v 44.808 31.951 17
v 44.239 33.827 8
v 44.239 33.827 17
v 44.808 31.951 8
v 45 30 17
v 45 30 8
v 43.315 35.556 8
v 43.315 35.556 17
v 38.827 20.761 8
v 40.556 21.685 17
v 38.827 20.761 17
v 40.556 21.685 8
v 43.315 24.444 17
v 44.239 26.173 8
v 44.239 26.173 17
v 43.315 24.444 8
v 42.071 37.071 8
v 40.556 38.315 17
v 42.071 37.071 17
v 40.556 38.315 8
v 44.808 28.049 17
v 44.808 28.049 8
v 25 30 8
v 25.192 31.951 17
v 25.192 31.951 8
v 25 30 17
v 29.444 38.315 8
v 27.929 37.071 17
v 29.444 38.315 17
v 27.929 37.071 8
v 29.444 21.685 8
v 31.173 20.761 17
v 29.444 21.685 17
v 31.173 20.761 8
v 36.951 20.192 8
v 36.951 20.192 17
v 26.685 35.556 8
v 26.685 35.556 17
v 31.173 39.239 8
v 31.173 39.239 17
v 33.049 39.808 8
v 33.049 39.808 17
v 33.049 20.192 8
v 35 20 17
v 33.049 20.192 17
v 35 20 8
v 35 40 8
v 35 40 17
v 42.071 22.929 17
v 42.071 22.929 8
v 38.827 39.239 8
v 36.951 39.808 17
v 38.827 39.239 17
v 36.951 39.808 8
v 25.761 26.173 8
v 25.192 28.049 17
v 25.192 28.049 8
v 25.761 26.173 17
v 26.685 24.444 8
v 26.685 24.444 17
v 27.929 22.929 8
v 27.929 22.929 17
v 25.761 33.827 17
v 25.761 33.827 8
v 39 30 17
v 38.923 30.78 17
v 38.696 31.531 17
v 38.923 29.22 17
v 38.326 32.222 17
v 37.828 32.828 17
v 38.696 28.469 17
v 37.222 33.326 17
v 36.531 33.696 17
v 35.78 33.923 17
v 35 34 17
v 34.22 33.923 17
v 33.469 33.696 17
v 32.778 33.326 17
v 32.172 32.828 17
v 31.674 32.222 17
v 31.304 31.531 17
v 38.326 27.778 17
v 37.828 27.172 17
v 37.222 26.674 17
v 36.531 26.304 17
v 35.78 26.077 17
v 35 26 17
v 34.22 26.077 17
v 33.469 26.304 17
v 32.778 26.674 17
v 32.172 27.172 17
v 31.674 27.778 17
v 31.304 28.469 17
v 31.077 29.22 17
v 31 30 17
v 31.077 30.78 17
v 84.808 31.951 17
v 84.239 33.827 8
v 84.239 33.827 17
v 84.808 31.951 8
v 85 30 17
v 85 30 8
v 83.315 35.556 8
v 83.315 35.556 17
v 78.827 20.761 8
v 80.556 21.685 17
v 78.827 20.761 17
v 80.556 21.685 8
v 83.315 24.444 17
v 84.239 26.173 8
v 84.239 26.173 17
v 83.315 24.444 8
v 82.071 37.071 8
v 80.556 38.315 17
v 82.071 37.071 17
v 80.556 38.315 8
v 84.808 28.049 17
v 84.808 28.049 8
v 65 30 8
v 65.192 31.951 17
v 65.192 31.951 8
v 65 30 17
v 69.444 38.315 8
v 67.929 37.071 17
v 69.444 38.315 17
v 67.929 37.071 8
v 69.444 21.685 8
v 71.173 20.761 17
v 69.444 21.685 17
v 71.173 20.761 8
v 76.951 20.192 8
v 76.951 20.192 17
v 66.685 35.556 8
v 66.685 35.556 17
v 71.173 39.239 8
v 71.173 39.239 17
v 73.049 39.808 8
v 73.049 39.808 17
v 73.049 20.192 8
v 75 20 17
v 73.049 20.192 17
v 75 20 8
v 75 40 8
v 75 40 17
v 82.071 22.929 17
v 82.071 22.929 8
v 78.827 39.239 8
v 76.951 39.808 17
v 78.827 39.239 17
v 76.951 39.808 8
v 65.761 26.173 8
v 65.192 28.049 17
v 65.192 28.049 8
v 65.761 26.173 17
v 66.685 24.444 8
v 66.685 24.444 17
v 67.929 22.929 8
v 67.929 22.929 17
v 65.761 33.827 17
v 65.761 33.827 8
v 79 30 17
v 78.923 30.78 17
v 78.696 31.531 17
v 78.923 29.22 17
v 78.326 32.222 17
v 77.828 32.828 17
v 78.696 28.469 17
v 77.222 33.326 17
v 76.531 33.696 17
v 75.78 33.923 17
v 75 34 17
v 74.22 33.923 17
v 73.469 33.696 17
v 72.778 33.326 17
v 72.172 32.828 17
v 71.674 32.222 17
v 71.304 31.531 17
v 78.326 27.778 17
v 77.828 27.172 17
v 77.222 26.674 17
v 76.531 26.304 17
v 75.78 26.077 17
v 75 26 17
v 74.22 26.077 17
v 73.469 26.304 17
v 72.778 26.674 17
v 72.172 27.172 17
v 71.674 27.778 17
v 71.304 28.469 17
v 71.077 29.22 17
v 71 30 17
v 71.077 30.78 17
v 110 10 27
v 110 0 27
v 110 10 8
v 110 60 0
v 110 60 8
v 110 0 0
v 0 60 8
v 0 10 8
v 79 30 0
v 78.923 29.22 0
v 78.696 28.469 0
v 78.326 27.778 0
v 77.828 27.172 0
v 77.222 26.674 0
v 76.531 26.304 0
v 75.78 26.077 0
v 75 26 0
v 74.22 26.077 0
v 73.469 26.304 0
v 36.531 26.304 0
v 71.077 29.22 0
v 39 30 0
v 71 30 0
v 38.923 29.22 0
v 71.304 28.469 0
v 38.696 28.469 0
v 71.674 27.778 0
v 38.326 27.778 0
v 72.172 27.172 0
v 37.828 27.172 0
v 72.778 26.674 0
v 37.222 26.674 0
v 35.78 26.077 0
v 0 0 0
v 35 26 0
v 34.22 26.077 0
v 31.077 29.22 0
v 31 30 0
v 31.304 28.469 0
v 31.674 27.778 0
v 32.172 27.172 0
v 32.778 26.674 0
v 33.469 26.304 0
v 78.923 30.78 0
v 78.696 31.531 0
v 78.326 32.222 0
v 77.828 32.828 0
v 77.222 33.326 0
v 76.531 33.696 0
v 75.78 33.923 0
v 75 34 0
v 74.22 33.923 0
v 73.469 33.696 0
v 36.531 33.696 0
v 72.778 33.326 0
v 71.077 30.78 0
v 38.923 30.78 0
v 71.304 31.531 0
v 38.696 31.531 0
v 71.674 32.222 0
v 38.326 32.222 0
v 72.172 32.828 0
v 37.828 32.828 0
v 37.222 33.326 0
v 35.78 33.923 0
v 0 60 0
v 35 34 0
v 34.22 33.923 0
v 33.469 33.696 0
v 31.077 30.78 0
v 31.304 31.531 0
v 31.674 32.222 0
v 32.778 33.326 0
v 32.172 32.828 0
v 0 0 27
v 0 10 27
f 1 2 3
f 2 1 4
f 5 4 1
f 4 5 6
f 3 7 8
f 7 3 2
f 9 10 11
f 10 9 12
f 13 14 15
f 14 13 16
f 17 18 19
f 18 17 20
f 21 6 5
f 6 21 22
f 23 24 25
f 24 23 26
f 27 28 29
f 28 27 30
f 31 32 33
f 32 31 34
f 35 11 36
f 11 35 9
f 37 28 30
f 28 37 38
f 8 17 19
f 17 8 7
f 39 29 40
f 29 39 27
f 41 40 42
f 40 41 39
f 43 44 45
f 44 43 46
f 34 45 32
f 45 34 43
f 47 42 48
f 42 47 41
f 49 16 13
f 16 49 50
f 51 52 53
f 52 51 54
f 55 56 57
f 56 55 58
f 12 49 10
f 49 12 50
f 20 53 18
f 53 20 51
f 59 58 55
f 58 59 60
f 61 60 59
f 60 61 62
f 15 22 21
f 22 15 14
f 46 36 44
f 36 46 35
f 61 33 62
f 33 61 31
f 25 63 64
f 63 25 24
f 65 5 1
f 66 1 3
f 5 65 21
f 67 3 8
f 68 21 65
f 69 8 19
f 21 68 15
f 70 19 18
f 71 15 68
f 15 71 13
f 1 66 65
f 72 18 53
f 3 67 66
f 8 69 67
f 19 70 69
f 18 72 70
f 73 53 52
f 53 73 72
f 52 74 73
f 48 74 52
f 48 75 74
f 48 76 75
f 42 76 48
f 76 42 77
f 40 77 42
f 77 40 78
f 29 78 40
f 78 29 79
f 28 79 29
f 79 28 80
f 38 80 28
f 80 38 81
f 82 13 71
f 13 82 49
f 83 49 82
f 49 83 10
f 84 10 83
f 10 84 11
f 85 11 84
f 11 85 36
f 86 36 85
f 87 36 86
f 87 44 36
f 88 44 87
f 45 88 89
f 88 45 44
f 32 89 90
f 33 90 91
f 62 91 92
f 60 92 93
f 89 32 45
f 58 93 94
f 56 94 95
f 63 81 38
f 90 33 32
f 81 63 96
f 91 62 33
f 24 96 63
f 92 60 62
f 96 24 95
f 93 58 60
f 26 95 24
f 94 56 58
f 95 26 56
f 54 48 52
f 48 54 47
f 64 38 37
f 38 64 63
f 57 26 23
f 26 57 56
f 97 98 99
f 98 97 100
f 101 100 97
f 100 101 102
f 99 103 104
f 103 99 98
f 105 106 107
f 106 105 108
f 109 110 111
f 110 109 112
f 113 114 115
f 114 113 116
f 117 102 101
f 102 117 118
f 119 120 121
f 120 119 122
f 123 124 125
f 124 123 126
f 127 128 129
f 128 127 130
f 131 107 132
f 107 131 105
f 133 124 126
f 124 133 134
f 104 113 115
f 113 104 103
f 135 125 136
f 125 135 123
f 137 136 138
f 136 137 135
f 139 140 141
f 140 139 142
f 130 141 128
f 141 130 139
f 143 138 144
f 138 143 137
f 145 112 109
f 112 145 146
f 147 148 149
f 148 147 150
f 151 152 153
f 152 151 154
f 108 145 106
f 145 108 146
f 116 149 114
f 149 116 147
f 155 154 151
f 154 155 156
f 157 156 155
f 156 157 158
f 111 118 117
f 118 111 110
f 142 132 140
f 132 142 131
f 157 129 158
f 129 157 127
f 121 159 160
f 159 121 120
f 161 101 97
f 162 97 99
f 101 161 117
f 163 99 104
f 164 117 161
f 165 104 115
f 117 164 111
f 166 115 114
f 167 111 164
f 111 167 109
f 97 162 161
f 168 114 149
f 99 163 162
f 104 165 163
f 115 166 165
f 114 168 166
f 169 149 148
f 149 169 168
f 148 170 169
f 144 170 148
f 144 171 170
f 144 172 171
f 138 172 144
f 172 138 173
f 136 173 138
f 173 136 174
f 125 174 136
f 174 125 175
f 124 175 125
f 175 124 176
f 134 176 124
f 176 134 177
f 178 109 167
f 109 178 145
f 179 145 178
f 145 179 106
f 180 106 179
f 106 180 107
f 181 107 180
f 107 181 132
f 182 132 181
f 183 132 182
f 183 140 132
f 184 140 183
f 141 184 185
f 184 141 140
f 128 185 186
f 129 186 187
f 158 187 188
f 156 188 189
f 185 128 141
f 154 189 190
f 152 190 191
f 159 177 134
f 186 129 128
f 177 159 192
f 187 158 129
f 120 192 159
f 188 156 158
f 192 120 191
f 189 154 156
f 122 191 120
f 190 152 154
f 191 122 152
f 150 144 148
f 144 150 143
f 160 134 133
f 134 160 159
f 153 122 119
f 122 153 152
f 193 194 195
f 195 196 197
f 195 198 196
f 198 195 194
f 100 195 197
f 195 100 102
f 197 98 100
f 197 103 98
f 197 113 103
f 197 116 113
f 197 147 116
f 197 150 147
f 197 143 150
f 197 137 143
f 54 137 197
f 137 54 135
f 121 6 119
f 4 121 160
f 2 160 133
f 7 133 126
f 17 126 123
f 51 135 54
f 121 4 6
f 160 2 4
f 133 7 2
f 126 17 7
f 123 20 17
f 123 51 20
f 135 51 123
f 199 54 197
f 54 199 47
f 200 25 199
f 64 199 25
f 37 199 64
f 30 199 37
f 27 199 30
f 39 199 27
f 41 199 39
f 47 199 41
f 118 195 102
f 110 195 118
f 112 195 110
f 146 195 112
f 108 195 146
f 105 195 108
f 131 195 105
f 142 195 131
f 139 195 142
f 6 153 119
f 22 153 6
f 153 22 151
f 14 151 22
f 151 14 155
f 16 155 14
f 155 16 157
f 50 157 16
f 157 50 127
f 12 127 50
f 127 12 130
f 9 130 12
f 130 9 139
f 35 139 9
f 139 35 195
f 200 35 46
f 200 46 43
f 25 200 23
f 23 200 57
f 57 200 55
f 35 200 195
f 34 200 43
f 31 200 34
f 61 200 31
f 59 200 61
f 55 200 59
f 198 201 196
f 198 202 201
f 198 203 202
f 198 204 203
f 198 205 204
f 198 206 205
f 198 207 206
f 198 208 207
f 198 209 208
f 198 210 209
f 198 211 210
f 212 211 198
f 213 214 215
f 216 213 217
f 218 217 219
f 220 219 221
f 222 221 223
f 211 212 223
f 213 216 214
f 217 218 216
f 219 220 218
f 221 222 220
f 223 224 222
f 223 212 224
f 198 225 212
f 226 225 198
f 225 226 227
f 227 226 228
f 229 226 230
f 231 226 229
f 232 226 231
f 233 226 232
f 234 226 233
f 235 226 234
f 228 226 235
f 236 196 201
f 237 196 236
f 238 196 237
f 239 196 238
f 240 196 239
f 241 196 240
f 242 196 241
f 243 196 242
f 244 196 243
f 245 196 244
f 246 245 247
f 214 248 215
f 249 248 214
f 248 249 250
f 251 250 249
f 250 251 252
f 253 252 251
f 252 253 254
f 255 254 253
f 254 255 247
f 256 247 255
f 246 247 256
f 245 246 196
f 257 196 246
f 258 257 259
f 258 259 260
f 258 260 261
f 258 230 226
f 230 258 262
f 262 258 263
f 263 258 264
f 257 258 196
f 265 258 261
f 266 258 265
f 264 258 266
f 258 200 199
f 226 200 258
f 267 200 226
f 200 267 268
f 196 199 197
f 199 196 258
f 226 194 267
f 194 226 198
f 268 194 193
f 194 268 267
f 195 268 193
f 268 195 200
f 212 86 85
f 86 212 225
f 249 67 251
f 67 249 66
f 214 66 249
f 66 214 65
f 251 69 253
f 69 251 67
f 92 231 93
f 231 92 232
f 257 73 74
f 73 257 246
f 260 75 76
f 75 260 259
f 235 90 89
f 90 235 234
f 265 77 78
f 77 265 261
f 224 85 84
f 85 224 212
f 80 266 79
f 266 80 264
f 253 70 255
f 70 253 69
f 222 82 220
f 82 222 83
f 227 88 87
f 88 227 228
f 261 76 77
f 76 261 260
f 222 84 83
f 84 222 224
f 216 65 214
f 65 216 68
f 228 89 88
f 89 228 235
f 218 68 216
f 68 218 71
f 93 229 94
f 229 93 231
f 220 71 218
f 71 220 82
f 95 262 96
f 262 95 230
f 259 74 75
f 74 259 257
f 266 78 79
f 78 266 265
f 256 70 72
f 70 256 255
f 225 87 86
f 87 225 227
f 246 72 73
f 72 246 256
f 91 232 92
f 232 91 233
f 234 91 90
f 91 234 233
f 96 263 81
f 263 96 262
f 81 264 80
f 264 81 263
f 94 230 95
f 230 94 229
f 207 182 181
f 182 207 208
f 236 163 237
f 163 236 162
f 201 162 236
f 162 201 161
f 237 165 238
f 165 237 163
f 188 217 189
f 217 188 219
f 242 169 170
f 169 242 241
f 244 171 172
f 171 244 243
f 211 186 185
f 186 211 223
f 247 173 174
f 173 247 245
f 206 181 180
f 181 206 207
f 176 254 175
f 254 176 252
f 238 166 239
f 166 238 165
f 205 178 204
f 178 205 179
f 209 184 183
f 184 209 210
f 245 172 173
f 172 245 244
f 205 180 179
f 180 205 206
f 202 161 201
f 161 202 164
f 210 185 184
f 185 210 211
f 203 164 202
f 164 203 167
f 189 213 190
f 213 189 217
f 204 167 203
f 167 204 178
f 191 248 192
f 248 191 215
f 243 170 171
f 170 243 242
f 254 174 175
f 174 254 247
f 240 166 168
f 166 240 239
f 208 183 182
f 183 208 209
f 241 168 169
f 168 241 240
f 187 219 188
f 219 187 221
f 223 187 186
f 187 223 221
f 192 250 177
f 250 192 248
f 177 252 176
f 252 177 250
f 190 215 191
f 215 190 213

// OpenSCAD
$fn = 32;

// ----------------------------------------------------------------------
// Drill jig: fence jig
// ----------------------------------------------------------------------

// --- parameters (mm) ---
plate_l = 110;            // plate length, X
plate_w = 60;             // plate width, Y
plate_t = 8;              // plate thickness
boss_d = 20;              // guide boss diameter
boss_h = 10;              // boss height above the plate
guide_d = 8;              // guide hole diameter
boss_pitch = 40;          // boss pitch
fence_h = 20;             // fence height above the plate
fence_t = 10;             // fence thickness
fit_tol = 0.1;            // tolerance for press fits, mm
free_tol = 0.3;           // tolerance for clearance fits, mm

n_boss = 2;  // guide bosses
boss_x0 = (plate_l - (n_boss - 1) * boss_pitch) / 2;  // first boss X
boss_top = plate_t - 1 + boss_h;  // boss crown height
fence_top = plate_t - 1 + fence_h;  // fence crown height
total_h = max([fence_top, boss_top]);  // overall height

difference() {
  union() {
  cube([plate_l, plate_w, plate_t]);
  for (i = [0 : n_boss - 1])
    translate([boss_x0 + i * boss_pitch, plate_w / 2, plate_t - 1])
      cylinder(h = boss_h, d = boss_d);
  translate([0, 0, plate_t - 1]) cube([plate_l, fence_t, fence_h]);
  }
  for (i = [0 : n_boss - 1])
    translate([boss_x0 + i * boss_pitch, plate_w / 2, -1])
      cylinder(h = plate_t + boss_h, d = guide_d);
}
